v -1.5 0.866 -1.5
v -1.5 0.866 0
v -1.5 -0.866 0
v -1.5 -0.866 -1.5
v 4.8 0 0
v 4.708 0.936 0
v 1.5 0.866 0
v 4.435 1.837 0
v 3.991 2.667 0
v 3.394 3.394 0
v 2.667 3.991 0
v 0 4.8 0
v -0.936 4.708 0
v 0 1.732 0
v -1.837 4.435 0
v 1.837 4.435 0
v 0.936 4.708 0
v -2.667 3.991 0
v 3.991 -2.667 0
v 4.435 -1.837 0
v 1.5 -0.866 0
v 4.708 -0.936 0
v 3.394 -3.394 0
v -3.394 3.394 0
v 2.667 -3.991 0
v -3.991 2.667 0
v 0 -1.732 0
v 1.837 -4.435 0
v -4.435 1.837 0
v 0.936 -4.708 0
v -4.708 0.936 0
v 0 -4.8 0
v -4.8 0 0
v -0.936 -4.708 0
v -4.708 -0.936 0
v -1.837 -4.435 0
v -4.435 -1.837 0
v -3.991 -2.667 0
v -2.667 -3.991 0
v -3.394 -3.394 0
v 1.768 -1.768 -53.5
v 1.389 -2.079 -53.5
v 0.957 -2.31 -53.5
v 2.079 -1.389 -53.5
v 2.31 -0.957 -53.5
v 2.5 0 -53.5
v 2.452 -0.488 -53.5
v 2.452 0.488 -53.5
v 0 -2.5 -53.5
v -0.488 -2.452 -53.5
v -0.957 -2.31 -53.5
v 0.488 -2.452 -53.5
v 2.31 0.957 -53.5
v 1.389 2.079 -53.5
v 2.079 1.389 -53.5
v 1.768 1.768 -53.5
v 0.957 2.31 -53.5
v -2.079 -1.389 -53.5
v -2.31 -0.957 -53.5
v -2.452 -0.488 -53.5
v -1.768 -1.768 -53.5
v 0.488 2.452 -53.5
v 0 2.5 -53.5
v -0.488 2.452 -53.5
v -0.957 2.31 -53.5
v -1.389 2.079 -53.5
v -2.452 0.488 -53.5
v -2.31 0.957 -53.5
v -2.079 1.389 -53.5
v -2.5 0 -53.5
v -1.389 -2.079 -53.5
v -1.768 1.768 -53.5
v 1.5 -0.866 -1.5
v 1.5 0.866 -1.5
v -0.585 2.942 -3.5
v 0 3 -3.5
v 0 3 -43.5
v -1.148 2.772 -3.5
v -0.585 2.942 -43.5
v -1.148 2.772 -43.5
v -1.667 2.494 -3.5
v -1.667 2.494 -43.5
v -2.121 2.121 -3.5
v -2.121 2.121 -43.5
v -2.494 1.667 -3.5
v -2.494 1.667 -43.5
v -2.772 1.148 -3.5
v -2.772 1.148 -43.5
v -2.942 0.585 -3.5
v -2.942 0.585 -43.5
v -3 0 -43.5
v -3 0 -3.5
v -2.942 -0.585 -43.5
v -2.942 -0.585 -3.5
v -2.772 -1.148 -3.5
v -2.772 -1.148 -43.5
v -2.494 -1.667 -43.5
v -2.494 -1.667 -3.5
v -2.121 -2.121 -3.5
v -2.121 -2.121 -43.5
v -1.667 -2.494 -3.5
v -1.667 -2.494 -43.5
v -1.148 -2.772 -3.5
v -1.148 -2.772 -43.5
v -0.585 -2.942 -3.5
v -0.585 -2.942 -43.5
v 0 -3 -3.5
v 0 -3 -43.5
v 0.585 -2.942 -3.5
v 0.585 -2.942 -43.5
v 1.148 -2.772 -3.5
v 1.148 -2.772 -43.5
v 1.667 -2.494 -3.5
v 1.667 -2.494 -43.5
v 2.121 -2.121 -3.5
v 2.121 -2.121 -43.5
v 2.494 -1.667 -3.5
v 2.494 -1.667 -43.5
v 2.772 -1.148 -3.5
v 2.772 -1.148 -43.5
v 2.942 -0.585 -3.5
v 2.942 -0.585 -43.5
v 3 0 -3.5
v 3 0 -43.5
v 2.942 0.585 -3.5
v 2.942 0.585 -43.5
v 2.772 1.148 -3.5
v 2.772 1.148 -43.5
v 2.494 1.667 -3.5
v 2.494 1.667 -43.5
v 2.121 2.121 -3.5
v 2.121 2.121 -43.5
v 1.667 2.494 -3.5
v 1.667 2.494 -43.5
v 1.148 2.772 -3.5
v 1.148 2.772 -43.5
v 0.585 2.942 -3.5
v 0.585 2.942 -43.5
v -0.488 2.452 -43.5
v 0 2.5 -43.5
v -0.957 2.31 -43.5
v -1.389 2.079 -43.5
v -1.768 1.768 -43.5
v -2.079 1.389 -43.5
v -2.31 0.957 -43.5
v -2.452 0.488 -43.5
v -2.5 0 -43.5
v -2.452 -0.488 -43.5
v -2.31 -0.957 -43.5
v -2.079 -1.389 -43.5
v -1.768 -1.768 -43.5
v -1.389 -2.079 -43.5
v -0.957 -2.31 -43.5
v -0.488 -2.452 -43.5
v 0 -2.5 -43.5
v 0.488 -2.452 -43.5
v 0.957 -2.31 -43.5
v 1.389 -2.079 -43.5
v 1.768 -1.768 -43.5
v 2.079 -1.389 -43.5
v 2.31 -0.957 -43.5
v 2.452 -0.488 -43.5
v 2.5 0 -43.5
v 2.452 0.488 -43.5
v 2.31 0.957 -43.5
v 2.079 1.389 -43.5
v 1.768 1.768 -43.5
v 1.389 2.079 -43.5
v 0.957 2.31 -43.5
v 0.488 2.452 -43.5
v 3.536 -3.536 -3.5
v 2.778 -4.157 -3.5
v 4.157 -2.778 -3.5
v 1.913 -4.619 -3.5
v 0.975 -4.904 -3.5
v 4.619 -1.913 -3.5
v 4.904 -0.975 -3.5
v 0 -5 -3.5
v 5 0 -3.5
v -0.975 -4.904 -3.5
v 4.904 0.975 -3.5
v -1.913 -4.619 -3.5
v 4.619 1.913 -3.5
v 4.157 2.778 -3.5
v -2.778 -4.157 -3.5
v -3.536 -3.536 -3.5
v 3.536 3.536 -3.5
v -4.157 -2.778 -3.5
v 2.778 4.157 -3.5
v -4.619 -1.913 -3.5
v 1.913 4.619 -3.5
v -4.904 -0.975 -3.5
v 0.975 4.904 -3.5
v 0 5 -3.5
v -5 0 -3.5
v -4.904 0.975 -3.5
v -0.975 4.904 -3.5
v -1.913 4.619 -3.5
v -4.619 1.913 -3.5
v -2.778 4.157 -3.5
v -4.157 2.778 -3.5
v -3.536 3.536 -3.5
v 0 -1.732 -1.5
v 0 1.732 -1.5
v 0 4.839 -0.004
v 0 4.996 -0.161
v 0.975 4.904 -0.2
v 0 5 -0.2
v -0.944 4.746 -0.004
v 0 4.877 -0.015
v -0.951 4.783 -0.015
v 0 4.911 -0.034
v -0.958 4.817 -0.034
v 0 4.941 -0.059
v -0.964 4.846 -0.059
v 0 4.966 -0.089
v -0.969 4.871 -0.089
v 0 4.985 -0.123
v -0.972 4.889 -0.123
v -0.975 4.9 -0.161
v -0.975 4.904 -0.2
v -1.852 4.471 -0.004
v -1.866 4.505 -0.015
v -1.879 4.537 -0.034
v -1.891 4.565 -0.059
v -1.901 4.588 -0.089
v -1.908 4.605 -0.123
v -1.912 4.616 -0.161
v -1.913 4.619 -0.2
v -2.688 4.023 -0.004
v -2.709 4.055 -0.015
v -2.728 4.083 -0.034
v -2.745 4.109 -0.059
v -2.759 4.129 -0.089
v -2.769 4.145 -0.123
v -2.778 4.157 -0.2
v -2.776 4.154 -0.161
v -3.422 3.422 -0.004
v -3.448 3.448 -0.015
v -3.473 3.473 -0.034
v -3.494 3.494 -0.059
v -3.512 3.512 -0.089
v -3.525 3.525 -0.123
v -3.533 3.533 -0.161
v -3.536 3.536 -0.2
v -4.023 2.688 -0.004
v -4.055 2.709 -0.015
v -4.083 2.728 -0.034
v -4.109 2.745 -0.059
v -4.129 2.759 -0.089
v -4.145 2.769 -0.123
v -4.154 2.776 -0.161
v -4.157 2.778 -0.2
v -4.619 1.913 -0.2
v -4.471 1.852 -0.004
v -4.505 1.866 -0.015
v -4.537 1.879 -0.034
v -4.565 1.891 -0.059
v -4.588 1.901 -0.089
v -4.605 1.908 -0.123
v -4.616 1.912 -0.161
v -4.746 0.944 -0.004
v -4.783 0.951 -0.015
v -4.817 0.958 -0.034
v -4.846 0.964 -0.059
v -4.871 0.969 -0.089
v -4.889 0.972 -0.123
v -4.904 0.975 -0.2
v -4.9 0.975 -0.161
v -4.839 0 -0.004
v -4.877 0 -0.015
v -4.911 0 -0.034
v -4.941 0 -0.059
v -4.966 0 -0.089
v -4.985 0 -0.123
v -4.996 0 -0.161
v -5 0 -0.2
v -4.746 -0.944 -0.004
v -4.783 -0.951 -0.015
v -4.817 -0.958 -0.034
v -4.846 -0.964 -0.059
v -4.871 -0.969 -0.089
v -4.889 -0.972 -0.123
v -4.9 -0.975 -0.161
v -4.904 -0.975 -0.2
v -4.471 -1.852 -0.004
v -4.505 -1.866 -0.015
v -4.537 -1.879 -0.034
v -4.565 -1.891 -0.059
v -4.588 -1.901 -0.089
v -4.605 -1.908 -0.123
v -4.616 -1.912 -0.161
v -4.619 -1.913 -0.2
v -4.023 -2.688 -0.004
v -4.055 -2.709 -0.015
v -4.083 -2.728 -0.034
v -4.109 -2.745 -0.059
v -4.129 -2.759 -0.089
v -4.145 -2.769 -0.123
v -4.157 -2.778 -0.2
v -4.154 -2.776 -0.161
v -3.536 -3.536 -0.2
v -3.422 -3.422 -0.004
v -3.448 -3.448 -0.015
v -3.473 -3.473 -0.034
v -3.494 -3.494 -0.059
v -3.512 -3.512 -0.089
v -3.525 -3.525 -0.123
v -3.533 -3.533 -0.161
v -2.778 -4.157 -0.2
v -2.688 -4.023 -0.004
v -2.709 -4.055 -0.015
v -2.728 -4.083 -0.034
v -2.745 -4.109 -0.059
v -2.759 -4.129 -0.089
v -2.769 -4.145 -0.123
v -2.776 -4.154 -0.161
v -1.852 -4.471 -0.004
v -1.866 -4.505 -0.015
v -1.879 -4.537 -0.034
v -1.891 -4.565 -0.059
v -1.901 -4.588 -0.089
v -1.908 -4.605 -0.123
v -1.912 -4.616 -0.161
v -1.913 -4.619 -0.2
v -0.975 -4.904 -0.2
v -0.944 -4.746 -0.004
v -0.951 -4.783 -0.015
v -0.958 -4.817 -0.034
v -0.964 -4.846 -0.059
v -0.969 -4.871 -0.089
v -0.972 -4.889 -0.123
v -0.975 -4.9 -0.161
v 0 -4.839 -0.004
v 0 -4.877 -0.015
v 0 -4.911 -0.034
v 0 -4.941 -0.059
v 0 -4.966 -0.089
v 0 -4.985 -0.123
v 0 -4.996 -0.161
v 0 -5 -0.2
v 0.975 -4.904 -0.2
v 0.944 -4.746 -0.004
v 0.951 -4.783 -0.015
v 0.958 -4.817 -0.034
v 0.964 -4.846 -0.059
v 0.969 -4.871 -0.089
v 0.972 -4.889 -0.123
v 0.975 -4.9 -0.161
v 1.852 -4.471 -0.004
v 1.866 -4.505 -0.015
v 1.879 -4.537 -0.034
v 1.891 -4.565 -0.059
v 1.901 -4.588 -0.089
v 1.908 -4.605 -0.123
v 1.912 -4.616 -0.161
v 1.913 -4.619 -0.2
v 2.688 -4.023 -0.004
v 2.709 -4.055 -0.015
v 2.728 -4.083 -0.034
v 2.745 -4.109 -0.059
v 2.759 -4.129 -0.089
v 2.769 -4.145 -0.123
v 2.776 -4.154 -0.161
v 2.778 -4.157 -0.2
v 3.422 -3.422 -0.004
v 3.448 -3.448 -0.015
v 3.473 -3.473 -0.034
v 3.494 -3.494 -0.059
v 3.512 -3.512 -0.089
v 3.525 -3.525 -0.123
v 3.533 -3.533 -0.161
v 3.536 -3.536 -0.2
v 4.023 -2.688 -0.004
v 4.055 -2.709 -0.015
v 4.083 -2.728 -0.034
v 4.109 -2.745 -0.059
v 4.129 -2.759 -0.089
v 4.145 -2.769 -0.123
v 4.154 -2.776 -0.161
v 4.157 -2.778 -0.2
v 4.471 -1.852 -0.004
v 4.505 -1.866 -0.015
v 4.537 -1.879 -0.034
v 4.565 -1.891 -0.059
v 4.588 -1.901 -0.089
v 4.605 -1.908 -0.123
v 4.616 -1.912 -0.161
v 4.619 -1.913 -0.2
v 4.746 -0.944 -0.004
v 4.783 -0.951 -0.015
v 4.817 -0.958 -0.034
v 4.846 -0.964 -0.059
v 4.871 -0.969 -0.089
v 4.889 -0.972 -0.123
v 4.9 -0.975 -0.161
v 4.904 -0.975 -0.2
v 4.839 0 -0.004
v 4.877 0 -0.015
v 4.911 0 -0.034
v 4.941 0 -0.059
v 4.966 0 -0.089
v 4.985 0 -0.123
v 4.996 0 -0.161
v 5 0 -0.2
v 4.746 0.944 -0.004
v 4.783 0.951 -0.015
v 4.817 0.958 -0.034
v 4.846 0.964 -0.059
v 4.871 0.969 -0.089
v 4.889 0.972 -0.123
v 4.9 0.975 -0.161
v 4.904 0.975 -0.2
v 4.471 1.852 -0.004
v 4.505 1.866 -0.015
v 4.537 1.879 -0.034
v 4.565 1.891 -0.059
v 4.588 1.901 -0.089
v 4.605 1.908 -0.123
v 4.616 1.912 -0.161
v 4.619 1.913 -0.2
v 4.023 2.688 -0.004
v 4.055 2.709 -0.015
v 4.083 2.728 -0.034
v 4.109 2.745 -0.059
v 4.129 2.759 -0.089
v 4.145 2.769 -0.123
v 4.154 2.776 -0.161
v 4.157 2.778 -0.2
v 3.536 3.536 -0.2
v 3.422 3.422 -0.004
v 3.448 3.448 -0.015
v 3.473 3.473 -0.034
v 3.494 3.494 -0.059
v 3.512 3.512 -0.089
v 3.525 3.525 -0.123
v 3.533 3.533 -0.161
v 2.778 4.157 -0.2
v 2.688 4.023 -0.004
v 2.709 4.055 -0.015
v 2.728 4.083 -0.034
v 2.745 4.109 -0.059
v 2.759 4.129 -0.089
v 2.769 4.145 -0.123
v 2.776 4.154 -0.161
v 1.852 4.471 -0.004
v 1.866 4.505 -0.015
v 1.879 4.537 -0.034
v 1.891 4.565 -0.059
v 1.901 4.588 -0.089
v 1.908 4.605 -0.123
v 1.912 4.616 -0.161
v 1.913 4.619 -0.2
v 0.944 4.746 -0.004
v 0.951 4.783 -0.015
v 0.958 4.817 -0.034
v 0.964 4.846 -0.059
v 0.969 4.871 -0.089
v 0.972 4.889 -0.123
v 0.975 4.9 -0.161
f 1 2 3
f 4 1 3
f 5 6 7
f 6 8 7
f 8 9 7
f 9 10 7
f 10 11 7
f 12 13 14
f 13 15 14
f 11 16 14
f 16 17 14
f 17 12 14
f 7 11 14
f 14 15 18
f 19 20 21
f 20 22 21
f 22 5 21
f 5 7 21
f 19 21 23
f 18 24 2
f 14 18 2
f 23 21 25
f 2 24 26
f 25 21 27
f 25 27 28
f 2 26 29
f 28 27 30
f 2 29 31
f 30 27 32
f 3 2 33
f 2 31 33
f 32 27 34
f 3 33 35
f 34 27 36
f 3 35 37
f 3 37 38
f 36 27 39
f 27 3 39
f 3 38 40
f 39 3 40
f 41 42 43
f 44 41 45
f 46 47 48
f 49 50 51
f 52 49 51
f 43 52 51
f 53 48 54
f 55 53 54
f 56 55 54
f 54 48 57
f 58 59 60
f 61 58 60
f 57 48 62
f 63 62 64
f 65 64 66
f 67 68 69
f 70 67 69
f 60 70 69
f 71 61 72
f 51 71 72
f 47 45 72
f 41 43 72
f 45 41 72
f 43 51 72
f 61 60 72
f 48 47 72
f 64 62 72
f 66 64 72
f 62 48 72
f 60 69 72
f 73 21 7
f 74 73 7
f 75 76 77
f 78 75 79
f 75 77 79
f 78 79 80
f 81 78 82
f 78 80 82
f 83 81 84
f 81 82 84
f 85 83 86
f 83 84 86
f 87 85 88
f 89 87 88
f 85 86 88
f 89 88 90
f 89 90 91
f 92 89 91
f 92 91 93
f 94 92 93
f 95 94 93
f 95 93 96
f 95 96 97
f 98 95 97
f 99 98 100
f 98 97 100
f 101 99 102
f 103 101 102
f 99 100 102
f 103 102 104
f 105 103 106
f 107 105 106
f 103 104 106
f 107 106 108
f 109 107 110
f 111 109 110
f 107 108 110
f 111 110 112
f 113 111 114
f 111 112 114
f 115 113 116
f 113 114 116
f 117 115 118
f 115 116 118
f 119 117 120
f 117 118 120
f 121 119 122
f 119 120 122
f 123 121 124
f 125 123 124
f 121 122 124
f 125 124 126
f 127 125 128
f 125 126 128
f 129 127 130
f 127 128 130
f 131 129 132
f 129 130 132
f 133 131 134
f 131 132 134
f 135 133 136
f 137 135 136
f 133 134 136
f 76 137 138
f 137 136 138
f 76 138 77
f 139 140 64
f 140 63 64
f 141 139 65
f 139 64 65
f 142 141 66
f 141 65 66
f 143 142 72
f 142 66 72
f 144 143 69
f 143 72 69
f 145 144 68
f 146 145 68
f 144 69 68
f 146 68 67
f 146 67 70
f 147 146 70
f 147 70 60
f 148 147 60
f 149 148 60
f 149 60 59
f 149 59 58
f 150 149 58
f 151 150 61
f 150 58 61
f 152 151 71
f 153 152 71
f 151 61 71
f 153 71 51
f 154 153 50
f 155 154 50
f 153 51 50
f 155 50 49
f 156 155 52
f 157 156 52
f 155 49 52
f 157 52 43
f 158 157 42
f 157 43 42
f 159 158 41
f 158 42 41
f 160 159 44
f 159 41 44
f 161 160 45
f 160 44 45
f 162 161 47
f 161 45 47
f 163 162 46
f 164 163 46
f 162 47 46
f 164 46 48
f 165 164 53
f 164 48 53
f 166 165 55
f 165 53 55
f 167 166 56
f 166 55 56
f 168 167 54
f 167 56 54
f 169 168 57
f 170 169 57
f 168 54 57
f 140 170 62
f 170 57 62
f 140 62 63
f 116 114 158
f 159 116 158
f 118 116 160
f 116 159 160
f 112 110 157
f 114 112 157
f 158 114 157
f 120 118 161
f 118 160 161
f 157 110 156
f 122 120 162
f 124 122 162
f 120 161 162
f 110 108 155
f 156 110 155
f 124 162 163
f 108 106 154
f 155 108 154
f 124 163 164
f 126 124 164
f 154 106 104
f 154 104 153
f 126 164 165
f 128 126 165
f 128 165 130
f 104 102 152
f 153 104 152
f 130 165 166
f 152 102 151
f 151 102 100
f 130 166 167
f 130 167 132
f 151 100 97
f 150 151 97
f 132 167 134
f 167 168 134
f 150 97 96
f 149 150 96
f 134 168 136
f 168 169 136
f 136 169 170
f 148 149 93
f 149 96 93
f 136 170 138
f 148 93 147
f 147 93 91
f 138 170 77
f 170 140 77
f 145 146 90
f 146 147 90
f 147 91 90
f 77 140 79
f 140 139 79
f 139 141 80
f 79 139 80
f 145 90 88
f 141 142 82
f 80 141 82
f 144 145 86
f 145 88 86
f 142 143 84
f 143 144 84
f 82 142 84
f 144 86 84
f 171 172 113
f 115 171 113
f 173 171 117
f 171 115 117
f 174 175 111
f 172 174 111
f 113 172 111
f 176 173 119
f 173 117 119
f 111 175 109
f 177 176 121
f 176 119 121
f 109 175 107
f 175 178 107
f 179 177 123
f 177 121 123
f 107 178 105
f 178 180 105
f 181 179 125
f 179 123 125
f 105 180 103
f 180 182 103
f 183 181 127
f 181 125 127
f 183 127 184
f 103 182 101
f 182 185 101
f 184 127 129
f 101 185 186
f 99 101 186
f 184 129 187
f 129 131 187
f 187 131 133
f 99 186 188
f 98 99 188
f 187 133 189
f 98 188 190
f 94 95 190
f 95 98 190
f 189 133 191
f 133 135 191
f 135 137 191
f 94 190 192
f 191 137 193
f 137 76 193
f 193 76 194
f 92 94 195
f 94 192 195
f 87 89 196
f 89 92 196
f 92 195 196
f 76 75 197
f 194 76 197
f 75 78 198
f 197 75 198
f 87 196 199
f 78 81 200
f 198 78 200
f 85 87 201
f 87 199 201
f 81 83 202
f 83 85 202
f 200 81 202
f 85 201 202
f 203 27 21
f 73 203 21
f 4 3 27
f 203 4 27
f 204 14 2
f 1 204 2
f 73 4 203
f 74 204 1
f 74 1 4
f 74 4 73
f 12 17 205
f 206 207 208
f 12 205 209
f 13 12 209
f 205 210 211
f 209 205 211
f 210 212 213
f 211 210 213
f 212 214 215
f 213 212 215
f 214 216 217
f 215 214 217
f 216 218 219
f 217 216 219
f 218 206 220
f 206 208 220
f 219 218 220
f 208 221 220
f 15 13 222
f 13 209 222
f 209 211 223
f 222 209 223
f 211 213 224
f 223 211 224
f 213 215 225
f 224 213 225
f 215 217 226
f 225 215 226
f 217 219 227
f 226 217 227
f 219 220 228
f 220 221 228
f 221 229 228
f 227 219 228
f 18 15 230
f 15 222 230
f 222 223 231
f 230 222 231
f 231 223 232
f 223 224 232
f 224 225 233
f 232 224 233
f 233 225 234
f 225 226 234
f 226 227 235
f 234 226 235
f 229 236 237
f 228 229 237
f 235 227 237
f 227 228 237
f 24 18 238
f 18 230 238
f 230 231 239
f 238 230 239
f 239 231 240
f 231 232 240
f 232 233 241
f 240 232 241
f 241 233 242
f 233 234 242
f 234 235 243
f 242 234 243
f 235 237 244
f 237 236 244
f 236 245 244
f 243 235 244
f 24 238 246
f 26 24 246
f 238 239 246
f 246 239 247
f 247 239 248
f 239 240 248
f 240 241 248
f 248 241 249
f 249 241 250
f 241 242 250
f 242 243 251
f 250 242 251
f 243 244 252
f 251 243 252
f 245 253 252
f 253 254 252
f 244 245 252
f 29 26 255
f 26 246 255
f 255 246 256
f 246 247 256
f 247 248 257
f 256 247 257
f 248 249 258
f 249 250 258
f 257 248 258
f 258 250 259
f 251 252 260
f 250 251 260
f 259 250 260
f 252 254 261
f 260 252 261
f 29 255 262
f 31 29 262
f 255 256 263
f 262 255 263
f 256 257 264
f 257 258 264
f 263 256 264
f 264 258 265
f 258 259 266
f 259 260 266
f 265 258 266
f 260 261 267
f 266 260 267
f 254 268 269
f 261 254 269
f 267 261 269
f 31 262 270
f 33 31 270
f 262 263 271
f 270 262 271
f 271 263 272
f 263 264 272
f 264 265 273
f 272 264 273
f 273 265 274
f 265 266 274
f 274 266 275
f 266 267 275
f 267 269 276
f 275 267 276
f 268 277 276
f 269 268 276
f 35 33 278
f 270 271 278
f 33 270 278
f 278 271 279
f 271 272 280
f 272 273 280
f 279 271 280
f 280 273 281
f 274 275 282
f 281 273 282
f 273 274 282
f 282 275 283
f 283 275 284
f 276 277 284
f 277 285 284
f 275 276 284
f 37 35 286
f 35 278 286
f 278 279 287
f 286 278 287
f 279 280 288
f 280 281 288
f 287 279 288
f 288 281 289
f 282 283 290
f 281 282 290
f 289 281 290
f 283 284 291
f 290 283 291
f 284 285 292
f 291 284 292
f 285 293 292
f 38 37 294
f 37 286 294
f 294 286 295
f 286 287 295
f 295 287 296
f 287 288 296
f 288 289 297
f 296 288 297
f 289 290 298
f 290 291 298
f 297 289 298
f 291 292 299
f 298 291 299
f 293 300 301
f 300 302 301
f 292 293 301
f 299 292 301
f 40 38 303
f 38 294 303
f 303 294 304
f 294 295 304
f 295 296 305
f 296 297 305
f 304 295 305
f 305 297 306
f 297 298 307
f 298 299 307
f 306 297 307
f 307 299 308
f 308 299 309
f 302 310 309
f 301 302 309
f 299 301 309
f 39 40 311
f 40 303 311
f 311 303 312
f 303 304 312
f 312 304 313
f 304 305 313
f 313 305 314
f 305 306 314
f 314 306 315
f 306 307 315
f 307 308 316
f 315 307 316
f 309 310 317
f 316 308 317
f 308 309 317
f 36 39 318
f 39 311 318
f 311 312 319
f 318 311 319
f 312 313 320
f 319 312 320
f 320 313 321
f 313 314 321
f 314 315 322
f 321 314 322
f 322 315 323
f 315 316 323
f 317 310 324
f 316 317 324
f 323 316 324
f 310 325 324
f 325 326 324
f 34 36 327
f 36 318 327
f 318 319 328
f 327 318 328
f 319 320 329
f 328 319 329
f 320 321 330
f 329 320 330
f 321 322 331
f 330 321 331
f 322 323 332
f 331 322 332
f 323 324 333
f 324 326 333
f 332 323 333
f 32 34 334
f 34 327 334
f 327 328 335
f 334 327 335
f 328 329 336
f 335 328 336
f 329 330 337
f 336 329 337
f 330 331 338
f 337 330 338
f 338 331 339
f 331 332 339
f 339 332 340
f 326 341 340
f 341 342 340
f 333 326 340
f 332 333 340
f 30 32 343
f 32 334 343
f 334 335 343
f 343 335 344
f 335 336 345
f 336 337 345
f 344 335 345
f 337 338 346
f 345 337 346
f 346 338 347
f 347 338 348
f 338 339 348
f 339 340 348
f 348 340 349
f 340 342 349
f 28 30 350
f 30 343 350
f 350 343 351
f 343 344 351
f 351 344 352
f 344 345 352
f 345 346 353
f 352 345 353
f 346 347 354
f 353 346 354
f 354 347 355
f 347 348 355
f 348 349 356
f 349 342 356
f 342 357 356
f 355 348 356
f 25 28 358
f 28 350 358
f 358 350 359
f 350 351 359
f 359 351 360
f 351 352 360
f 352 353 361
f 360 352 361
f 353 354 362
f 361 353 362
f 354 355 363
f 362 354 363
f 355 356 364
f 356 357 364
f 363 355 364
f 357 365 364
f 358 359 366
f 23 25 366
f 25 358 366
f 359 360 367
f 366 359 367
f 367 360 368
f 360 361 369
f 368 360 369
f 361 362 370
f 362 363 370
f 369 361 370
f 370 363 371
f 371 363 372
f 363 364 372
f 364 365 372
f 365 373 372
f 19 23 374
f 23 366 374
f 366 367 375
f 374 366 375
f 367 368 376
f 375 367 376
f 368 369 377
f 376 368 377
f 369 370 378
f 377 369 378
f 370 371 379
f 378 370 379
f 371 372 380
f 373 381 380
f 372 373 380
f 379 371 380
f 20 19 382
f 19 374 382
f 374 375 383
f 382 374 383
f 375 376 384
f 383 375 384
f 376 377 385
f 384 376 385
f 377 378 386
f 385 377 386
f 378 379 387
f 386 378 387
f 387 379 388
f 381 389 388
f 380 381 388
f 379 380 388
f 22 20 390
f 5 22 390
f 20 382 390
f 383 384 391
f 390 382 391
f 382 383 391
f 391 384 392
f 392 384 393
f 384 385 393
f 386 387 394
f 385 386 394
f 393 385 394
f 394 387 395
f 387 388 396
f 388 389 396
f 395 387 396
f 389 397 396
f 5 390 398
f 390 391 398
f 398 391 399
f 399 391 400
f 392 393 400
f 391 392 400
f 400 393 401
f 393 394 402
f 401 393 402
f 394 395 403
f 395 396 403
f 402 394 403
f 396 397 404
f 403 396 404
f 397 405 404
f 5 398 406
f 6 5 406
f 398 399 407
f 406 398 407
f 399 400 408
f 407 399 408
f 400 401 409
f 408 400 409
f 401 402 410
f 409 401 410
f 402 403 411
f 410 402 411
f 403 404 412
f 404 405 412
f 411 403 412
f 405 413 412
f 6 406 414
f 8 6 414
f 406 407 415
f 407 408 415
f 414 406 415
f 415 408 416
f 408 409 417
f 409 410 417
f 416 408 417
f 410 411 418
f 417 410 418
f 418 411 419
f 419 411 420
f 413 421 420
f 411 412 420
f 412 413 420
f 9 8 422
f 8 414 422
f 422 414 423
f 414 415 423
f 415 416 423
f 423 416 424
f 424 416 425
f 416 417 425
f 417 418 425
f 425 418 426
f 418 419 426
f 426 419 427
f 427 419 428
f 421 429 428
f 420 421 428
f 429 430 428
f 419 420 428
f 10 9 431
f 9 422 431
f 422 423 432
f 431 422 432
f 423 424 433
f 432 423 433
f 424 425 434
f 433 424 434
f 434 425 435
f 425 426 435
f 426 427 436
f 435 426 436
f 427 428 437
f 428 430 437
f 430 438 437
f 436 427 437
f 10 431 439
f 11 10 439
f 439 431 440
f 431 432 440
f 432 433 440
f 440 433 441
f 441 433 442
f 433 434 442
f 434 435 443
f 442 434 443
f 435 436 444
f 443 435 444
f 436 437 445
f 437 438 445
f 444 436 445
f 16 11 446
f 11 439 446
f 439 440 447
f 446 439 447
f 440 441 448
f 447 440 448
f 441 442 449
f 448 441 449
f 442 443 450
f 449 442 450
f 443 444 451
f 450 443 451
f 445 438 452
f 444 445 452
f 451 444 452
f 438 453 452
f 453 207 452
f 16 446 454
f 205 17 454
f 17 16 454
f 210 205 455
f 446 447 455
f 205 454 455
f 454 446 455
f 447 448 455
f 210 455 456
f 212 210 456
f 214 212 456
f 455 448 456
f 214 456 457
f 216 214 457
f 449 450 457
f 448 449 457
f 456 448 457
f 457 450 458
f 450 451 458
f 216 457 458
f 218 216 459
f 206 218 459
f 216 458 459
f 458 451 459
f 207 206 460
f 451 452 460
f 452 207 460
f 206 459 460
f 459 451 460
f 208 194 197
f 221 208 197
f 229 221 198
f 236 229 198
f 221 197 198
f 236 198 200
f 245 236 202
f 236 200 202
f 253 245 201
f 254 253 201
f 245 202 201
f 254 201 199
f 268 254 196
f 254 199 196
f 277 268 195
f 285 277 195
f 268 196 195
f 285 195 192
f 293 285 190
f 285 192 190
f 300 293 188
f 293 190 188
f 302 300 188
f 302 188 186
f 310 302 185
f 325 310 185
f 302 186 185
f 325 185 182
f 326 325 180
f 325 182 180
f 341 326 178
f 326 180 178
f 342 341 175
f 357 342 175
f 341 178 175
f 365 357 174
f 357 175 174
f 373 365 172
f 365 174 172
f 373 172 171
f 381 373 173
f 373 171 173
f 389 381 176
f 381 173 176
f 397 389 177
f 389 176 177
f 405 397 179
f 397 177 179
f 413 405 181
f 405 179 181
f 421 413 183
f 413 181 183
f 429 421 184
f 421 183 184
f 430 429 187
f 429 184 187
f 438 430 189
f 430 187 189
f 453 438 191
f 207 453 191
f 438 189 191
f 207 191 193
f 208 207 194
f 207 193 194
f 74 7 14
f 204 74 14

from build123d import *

# Parameters (mm, degrees)
CUT_EXTRUDE_1_DEPTH = 1.5
FILLET_1_R          = 0.2


with BuildPart() as part:
    # 草图1 → 旋转1 (revolve)
    with BuildSketch(Plane(origin=(0, 0, 0), x_dir=(0, 0, -1), z_dir=(1, 0, 0))):
        Polygon((0, 0), (0, 5), (3.5, 5), (3.5, 3), (43.5, 3), (43.5, 2.5), (53.5, 2.5), (53.5, 0), align=None)
    revolve(axis=Axis((0, 0, -53.5), (0, 0, 1)))

    # 草图2 → 切除-拉伸1 (cut)
    with BuildSketch(Plane.XY):
        Polygon((1.5, 0.866025404), (0, 1.732050808), (-1.5, 0.866025404), (-1.5, -0.866025404), (0, -1.732050808), (1.5, -0.866025404), align=None)
    extrude(amount=-CUT_EXTRUDE_1_DEPTH, mode=Mode.SUBTRACT)

    # 圆角1
    fillet_1_edges = [part.edges().sort_by_distance(p)[0] for p in [
        (0, -5, 0),
    ]]
    fillet(fillet_1_edges, radius=FILLET_1_R)


solid = part.part
